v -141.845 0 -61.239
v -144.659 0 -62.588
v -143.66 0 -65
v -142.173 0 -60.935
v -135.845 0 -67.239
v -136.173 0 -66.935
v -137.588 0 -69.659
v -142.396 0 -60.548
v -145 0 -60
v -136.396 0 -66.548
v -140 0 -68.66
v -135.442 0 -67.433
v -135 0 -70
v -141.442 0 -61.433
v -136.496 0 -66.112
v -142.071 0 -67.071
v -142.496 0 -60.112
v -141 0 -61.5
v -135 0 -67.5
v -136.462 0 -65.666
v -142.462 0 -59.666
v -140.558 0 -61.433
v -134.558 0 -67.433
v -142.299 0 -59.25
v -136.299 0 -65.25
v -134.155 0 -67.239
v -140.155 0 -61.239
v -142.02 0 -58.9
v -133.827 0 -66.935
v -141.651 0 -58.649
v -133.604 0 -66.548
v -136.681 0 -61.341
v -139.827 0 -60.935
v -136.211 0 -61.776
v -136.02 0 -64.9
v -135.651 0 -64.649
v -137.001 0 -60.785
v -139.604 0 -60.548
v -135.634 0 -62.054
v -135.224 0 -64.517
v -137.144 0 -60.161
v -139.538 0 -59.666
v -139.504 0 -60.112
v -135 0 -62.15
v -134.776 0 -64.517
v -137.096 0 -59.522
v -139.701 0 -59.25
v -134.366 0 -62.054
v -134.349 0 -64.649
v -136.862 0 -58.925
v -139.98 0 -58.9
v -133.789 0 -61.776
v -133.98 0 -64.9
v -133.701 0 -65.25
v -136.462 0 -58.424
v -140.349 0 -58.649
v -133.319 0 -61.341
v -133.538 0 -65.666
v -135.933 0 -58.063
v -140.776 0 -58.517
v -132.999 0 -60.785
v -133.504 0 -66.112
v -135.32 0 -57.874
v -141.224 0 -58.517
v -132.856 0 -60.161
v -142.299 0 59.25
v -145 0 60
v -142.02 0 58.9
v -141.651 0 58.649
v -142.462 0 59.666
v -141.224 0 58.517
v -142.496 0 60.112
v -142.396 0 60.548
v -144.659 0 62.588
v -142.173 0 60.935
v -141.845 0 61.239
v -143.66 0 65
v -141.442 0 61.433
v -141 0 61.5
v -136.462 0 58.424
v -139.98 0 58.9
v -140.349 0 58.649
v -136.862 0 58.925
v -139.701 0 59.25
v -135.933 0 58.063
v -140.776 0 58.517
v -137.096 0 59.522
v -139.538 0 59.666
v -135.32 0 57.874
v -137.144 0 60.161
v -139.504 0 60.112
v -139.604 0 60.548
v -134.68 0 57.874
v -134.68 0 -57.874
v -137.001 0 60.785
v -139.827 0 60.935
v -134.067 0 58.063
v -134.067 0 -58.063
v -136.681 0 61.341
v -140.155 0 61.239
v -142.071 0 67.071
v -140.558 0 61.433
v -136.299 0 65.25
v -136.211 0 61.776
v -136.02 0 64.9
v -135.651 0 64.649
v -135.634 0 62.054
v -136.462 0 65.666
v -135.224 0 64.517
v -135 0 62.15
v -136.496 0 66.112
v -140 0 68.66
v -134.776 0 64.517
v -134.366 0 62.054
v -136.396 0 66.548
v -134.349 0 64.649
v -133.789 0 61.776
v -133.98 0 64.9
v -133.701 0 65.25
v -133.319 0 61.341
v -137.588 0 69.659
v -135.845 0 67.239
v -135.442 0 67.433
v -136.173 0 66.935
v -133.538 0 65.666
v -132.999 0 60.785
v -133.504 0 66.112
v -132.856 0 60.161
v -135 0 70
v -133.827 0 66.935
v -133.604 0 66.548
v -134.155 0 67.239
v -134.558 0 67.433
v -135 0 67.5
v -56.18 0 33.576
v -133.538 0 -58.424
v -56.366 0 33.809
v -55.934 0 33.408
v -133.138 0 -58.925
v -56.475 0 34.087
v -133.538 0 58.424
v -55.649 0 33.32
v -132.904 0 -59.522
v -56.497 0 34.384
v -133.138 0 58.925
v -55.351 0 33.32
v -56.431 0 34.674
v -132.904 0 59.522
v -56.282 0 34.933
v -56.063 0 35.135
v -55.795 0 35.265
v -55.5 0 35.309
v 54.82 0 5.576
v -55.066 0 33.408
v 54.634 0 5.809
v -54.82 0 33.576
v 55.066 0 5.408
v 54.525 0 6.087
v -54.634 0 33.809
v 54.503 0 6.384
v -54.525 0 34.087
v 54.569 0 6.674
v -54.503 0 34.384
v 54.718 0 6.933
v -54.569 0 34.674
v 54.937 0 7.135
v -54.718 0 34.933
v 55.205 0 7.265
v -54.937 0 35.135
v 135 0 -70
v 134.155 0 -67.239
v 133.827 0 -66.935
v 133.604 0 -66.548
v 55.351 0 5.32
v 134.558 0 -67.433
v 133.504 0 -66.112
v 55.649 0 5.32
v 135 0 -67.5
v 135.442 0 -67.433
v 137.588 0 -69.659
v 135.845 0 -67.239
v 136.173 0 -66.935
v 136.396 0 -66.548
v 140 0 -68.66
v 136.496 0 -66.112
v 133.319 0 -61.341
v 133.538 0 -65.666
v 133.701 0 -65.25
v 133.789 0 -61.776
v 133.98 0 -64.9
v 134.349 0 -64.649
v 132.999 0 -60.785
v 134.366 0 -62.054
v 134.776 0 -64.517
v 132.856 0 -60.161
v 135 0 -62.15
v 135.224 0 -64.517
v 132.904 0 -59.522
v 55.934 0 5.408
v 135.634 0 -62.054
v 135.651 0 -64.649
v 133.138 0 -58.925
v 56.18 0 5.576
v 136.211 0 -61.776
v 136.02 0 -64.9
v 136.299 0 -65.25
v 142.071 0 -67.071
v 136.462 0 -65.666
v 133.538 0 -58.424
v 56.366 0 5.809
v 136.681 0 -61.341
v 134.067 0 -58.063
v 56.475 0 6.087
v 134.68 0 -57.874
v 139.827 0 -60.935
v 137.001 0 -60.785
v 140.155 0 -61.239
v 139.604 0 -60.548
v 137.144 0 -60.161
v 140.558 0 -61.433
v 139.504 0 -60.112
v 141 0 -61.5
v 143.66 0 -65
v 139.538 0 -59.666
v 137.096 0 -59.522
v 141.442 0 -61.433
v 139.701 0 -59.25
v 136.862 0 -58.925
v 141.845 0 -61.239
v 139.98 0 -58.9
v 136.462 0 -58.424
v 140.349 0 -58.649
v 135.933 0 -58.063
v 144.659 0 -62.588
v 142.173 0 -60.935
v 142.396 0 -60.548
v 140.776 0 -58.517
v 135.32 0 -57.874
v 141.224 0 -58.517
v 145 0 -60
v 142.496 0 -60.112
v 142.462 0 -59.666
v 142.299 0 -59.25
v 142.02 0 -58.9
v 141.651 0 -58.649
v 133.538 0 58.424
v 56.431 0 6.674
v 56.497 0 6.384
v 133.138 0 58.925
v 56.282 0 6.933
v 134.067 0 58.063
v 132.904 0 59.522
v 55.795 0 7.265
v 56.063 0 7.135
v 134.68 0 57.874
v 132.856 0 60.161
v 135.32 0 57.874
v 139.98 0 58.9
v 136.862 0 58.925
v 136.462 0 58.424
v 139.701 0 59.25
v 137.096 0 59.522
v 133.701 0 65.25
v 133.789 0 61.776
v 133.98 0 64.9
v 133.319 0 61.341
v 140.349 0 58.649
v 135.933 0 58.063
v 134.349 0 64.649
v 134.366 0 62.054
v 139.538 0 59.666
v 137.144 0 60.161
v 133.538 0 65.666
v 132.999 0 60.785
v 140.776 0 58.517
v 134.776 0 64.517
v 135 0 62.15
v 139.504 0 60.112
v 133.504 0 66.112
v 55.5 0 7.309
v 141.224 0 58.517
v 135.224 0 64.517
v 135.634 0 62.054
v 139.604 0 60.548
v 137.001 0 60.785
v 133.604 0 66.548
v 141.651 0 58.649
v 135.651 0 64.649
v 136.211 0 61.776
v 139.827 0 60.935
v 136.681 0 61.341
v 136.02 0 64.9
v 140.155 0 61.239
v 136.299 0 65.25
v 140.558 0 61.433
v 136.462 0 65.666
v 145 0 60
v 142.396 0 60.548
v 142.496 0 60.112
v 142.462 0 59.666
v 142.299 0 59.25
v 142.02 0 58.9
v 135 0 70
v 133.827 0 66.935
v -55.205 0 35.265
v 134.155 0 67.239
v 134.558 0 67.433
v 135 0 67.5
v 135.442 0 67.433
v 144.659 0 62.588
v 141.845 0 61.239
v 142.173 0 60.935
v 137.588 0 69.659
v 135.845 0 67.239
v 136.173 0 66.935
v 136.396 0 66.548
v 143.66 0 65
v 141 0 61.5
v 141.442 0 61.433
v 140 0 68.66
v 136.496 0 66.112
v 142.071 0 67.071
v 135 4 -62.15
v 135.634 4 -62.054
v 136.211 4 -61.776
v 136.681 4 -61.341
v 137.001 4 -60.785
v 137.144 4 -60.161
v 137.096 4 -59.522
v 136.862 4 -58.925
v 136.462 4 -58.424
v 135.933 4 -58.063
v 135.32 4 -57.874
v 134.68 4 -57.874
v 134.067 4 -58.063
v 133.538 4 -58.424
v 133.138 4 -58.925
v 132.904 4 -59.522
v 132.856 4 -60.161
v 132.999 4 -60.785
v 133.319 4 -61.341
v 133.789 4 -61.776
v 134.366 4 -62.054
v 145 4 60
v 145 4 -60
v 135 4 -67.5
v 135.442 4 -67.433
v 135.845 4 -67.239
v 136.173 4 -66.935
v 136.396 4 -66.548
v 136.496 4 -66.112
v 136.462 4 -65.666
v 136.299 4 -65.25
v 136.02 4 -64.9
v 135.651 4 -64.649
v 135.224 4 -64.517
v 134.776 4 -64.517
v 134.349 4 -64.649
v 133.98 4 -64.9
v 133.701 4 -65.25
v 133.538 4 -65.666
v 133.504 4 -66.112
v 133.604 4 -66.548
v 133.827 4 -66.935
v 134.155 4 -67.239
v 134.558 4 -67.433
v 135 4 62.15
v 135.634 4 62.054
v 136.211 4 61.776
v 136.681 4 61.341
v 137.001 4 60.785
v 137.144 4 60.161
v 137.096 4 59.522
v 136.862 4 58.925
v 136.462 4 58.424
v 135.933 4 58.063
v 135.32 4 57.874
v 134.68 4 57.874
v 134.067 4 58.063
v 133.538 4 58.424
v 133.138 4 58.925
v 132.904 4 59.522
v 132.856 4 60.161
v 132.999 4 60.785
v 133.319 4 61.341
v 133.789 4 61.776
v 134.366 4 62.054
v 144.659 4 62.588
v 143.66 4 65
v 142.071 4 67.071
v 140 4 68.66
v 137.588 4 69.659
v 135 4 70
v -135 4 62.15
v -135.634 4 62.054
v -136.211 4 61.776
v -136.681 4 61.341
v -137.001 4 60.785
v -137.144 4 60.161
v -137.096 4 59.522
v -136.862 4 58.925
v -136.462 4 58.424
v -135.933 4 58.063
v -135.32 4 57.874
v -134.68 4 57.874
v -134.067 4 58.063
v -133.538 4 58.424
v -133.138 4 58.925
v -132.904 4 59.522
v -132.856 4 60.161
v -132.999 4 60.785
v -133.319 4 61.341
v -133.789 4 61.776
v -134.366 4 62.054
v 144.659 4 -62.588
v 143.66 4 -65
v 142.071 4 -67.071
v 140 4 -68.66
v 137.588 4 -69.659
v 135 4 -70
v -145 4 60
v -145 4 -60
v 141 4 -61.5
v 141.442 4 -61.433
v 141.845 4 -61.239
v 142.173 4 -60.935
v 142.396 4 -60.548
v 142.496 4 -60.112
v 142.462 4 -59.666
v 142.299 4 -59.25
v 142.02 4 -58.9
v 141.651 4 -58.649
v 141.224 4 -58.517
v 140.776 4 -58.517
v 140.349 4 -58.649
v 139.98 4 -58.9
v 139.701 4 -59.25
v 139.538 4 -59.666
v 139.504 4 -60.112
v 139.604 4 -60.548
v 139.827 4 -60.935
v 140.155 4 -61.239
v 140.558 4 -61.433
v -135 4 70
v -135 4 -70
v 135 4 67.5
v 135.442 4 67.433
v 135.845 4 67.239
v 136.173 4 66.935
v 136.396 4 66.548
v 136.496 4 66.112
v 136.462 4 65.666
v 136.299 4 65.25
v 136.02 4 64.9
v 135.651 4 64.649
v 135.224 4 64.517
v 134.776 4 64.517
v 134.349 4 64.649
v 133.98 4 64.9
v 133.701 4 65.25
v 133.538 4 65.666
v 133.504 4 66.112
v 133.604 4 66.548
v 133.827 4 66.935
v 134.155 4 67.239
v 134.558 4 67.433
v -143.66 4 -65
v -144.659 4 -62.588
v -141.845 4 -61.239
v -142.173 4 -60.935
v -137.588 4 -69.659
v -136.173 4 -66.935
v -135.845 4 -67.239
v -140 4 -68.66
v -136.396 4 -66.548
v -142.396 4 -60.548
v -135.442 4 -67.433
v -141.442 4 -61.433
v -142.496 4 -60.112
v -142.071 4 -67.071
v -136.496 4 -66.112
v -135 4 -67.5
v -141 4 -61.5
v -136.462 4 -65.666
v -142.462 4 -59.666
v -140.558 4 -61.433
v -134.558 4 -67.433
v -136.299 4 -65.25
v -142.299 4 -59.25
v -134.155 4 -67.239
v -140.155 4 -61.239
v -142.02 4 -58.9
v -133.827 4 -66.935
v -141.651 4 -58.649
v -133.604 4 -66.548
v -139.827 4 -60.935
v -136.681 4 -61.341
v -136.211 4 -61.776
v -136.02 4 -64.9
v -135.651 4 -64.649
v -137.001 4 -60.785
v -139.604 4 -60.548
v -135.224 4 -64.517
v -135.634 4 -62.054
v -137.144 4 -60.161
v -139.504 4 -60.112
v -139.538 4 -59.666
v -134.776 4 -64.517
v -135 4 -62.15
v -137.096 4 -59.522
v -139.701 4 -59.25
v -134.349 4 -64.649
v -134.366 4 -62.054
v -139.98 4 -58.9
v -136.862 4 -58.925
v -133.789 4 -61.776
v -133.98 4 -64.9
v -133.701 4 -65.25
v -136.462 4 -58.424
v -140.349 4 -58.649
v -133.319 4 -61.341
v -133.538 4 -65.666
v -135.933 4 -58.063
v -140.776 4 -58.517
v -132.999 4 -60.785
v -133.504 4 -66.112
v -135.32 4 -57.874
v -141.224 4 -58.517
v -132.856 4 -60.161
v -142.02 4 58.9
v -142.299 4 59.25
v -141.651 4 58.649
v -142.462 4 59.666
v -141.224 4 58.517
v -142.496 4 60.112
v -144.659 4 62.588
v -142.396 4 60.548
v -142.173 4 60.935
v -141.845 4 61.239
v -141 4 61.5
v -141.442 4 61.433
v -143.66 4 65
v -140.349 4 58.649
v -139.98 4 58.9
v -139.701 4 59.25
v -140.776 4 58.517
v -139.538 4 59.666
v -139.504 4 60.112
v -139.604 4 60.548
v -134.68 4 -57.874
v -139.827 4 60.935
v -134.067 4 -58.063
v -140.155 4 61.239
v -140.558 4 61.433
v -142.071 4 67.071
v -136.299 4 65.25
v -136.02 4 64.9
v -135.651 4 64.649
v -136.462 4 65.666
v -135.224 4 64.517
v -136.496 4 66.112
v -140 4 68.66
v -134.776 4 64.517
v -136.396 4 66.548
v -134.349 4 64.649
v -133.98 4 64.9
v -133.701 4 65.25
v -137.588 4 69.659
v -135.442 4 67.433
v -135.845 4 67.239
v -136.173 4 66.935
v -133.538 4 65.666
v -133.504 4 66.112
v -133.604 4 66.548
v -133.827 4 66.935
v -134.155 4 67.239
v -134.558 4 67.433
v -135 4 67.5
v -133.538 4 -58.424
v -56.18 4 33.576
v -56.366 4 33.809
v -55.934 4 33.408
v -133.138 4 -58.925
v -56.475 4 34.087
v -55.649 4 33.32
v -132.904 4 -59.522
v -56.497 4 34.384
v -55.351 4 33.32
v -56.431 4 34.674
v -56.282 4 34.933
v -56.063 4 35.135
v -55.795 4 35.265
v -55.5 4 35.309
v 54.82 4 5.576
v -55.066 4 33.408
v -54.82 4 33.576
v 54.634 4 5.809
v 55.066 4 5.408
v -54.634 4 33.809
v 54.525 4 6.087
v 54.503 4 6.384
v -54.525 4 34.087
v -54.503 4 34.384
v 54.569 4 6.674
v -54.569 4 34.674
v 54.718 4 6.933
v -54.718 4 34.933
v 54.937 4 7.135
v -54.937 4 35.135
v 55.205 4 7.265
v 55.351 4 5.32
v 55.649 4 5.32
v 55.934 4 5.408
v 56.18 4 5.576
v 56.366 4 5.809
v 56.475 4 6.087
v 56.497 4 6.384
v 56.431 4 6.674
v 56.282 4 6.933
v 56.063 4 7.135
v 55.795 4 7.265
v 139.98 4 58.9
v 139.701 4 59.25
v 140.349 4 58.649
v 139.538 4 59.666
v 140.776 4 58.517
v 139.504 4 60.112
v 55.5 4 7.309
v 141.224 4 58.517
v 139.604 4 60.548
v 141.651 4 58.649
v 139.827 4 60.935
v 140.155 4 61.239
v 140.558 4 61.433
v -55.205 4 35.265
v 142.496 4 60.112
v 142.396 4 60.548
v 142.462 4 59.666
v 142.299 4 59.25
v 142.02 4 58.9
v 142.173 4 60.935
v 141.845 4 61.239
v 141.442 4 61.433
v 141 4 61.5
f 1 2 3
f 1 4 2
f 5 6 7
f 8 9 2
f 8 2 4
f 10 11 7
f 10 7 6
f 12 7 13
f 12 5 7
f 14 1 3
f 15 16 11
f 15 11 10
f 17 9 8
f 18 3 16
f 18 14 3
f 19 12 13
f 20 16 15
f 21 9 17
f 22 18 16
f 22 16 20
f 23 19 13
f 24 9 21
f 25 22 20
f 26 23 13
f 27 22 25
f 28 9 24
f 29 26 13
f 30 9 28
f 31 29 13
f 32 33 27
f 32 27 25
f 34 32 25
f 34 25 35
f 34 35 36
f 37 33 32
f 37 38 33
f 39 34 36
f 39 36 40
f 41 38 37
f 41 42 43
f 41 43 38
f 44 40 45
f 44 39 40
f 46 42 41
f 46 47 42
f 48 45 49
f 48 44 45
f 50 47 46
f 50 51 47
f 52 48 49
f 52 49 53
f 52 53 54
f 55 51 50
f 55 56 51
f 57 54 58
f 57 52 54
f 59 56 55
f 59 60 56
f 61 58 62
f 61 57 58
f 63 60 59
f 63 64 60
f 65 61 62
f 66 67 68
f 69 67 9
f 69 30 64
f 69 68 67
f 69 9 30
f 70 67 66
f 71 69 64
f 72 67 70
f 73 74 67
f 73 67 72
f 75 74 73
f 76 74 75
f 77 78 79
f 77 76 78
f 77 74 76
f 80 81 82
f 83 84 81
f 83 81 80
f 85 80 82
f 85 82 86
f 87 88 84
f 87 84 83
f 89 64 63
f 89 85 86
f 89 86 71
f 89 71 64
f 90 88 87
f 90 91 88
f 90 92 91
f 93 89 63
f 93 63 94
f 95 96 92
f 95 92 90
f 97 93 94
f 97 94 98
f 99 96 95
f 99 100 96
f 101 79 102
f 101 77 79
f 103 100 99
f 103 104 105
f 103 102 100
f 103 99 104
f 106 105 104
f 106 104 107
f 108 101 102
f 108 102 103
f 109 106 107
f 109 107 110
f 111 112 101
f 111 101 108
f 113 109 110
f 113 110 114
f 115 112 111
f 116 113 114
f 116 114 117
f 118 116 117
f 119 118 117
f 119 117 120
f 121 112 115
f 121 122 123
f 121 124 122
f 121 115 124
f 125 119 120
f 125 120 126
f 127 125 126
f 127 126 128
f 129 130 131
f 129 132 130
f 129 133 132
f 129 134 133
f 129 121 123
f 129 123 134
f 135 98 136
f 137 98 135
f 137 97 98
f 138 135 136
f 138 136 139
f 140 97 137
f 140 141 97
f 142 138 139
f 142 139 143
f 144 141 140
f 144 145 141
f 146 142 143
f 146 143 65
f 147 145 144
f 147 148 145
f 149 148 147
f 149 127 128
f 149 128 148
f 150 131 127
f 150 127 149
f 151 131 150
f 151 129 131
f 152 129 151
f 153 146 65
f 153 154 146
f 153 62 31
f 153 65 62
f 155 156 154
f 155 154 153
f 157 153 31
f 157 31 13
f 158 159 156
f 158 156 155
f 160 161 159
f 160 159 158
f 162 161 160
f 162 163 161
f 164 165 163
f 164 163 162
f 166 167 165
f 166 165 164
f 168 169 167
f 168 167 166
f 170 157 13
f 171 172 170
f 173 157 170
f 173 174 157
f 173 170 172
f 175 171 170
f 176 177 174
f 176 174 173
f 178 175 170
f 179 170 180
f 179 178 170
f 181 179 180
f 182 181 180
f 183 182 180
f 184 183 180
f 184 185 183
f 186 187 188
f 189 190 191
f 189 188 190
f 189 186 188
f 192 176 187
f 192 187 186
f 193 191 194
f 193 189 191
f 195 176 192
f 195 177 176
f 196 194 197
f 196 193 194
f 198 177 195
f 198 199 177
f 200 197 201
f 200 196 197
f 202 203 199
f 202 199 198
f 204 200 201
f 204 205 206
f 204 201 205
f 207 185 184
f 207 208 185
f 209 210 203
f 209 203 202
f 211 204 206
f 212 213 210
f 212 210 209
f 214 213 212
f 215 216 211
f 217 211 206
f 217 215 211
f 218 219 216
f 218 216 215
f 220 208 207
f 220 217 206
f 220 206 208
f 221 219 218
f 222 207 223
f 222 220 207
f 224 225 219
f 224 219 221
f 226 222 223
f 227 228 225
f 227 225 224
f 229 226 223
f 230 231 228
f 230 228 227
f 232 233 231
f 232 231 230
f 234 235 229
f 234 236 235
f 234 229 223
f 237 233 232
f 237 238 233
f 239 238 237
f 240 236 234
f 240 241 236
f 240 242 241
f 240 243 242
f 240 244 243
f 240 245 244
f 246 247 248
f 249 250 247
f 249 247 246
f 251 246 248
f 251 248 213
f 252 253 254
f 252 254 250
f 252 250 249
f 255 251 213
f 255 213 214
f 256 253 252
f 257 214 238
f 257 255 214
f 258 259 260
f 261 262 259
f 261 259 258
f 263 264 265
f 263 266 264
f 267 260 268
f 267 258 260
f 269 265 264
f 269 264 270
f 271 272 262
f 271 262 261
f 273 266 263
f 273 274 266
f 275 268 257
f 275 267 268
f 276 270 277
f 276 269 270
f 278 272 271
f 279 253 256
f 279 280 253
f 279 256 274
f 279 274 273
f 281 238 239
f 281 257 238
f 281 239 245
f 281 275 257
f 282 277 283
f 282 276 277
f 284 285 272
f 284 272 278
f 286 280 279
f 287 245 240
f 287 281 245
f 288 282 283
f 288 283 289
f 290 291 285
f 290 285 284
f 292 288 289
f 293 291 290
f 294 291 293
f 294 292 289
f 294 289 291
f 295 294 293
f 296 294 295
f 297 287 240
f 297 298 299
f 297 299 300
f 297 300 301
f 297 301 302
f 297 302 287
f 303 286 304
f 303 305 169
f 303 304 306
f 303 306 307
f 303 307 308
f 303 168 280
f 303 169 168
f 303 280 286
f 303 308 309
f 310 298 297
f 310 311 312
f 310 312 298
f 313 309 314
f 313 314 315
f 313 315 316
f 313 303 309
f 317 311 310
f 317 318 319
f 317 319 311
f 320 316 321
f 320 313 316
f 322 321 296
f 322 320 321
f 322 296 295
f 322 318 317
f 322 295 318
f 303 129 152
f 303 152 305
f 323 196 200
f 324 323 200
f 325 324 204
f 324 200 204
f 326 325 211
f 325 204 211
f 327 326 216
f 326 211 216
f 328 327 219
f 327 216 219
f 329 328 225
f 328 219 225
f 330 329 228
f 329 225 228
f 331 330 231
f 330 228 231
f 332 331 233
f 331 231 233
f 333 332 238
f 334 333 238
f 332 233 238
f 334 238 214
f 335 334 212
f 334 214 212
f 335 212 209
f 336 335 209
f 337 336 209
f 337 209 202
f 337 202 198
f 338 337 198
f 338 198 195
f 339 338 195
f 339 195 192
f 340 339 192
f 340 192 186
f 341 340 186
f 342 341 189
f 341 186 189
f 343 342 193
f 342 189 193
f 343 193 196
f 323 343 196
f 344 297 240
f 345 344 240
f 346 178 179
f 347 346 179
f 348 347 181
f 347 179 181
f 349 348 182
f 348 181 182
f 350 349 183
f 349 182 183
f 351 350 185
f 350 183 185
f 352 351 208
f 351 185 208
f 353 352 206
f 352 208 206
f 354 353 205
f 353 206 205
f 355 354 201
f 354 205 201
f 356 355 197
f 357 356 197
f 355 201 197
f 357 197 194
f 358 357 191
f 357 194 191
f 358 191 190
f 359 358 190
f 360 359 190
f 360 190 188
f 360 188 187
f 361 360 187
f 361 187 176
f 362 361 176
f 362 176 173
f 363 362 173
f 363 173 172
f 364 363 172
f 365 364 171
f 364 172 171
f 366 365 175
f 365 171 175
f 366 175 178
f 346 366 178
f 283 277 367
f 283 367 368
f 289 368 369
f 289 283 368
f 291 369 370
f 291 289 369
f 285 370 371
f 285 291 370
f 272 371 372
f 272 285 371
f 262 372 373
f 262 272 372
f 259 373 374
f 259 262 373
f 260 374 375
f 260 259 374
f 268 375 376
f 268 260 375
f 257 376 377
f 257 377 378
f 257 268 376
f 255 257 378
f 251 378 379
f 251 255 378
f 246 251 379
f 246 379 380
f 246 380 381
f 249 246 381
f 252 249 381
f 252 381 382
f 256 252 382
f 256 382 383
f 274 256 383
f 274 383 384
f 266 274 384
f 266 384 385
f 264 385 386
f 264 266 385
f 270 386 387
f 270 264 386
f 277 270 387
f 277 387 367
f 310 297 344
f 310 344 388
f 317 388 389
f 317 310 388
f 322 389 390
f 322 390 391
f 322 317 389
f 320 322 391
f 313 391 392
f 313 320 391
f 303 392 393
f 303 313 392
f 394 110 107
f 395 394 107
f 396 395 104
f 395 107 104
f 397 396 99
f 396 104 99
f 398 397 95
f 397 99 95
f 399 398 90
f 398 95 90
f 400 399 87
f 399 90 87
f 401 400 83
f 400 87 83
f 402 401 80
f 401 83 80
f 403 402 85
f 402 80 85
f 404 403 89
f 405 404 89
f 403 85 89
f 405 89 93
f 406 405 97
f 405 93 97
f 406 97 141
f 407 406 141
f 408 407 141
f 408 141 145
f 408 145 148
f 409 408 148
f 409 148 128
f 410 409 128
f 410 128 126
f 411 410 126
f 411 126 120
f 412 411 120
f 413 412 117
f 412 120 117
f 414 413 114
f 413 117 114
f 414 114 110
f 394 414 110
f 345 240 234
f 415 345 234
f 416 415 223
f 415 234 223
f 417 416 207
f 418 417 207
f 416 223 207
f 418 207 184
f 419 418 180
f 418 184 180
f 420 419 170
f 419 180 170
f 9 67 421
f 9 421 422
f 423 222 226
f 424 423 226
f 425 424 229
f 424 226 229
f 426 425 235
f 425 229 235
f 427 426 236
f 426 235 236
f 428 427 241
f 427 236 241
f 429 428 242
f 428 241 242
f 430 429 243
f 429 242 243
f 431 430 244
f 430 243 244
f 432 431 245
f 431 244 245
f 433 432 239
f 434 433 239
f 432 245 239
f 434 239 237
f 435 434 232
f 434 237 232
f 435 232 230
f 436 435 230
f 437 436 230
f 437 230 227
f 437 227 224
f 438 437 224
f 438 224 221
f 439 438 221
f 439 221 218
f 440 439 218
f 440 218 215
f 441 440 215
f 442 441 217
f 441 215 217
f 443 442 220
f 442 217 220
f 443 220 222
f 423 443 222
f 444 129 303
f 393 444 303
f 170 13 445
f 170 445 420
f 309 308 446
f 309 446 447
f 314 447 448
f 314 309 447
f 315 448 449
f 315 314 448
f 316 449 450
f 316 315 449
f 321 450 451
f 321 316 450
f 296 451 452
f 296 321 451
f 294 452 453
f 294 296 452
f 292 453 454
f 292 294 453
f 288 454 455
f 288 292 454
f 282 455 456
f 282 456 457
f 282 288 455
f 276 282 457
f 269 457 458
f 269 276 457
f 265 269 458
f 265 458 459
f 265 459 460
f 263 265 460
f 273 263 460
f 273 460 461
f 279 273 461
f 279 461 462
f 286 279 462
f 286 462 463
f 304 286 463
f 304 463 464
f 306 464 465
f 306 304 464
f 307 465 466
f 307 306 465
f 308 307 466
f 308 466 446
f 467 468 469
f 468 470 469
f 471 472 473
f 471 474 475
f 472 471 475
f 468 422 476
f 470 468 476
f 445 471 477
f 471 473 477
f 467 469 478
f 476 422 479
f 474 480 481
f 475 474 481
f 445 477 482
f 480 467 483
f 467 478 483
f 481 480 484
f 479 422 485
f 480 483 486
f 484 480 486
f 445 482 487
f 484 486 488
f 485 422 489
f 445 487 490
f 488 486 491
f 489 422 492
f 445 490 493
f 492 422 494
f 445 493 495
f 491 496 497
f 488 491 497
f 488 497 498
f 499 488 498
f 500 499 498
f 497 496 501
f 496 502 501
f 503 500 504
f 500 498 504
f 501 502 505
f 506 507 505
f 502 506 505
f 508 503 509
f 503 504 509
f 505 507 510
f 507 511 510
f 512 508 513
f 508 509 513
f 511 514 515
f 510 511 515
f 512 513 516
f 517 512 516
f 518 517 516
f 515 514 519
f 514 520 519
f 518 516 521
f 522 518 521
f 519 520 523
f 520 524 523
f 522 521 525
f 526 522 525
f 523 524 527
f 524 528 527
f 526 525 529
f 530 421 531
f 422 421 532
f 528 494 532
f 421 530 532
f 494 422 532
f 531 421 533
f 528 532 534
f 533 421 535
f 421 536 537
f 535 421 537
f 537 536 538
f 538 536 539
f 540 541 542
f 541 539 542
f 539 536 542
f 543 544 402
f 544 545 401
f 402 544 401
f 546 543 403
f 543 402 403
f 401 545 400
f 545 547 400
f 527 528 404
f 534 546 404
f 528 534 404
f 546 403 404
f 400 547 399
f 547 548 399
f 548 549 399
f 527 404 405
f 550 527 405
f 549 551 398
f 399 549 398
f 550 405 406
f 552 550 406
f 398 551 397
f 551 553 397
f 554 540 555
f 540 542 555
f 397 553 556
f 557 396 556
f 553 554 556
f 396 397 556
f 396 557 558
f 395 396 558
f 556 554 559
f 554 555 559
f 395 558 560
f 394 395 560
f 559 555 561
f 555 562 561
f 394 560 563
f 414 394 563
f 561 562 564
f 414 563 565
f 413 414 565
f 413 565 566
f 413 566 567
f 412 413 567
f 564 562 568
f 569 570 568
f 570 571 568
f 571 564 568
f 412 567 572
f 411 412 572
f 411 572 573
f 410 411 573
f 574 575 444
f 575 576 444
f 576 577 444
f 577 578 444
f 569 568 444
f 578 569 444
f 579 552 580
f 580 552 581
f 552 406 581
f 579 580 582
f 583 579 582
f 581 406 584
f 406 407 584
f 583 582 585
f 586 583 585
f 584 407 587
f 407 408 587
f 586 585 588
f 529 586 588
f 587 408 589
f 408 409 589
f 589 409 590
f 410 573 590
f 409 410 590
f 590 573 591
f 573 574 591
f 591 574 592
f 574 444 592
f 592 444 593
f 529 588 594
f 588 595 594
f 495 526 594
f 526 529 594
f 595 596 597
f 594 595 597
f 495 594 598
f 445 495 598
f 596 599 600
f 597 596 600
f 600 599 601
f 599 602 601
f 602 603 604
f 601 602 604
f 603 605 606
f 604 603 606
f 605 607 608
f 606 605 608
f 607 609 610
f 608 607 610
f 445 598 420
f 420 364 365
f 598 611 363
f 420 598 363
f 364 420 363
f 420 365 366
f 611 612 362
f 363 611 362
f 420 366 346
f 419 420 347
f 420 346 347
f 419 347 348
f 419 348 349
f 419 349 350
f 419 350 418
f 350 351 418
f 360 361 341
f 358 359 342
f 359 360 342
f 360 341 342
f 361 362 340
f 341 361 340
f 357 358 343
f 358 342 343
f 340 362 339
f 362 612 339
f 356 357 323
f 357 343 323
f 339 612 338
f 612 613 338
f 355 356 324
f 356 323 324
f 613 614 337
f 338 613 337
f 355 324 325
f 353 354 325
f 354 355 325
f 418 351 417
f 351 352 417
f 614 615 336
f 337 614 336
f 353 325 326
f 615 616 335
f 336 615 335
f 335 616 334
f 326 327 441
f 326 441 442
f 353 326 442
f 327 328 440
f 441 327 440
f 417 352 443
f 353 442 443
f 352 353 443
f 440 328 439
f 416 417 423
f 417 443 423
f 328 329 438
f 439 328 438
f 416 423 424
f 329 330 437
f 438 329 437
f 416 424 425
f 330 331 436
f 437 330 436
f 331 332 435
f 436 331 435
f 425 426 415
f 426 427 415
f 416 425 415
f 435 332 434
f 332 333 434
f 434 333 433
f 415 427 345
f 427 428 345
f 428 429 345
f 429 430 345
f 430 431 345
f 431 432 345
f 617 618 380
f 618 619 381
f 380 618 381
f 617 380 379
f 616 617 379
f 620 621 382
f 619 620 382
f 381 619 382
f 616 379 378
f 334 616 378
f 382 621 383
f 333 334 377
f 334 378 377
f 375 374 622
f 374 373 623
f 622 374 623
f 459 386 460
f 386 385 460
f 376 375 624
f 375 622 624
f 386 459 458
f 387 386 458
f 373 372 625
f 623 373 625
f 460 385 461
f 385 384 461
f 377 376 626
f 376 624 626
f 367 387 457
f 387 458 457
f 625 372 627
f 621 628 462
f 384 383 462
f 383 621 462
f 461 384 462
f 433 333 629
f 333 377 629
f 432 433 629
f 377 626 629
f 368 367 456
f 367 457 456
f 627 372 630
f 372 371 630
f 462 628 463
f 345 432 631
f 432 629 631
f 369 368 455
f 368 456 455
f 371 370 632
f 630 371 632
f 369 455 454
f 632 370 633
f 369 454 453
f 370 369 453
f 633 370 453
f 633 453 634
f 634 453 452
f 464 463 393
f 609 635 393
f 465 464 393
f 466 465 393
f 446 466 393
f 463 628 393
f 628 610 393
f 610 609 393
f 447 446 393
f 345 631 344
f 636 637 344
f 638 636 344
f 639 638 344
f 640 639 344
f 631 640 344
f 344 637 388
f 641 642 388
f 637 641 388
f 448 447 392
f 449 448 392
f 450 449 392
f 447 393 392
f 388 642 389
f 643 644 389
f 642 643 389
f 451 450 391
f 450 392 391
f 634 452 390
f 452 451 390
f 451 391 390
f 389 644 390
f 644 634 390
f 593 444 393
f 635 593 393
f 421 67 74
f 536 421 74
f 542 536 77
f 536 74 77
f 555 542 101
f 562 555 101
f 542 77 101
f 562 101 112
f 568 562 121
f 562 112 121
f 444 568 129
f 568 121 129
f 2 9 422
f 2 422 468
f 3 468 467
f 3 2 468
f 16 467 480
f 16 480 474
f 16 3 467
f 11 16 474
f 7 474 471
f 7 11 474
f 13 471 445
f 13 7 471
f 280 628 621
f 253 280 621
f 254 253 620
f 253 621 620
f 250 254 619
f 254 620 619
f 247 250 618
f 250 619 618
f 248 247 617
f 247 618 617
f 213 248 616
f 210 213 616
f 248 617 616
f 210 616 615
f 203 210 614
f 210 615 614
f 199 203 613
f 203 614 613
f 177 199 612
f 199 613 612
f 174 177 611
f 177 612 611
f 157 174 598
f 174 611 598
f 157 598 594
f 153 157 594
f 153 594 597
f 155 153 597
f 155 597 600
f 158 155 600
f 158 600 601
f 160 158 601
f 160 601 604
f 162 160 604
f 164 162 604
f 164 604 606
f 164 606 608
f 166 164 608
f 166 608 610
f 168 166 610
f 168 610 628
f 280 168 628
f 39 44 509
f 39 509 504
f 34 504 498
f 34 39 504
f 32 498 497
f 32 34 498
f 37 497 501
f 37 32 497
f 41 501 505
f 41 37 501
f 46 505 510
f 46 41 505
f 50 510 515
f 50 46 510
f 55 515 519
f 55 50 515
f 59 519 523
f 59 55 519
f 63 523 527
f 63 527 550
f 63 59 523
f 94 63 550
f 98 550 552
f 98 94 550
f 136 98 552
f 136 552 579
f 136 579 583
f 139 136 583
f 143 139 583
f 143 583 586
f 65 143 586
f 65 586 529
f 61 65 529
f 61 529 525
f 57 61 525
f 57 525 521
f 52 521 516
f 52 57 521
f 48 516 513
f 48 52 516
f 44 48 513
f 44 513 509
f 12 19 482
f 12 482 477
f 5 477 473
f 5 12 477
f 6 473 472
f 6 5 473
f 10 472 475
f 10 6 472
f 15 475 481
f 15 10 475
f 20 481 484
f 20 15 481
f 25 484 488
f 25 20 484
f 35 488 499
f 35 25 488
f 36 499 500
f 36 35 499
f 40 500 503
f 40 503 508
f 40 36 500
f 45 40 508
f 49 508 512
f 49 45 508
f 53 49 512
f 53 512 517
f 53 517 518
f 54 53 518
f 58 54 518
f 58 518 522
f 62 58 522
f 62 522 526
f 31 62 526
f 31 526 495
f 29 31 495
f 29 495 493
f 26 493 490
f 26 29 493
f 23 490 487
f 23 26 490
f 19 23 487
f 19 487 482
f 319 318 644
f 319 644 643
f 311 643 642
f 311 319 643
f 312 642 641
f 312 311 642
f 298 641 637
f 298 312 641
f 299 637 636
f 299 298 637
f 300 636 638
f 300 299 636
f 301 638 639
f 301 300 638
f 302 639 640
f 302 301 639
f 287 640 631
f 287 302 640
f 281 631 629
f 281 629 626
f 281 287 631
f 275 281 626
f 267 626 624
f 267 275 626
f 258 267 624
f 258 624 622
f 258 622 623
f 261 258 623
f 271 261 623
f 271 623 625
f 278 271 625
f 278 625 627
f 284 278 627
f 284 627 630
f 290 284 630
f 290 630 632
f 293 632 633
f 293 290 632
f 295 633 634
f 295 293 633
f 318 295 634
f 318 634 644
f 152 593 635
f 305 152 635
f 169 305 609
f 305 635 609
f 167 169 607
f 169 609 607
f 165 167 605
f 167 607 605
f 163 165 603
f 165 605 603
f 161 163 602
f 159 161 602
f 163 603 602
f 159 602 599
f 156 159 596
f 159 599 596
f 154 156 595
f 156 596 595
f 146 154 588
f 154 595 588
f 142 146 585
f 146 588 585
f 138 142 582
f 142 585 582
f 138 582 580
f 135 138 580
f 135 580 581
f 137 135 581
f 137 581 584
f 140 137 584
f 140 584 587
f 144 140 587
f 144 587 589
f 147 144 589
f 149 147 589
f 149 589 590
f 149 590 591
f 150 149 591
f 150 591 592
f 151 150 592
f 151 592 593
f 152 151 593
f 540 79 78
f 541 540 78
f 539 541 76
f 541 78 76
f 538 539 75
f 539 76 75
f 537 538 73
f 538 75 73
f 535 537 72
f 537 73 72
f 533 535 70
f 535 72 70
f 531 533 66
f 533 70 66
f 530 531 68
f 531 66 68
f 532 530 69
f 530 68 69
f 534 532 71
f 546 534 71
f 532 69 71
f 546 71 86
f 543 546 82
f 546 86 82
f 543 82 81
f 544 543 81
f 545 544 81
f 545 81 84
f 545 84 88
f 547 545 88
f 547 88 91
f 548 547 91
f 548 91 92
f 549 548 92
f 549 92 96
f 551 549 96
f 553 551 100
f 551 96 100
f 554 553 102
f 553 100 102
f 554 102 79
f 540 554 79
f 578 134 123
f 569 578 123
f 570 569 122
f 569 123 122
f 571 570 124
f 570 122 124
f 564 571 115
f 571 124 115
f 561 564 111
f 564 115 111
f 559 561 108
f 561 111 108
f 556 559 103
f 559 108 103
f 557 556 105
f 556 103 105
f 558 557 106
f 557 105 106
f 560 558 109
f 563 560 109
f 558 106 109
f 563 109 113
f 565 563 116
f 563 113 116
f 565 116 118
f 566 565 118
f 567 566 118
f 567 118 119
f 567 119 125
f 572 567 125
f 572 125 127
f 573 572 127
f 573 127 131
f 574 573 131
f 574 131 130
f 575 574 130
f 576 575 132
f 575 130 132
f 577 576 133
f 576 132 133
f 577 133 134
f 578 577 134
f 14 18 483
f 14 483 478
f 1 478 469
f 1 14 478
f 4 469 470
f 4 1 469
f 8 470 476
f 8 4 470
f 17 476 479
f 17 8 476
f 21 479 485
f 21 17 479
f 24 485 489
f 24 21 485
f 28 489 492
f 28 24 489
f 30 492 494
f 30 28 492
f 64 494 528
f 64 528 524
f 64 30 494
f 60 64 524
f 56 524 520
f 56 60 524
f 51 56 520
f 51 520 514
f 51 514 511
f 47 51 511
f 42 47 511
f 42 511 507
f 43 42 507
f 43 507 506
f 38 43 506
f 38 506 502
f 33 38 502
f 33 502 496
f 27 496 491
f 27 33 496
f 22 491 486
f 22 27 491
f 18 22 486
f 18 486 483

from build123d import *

# Parameters (mm, degrees)
SKETCH1_R                 = 2.15
SKETCH1_R_2               = 1.5
BOSS_EXTRUDE1_DEPTH       = 4
MIRROR2_COPY_1_SKETCH_R   = 2.15
MIRROR2_COPY_1_SKETCH_R_2 = 1.5
MIRROR2_COPY_1_DEPTH      = 4
SKETCH2_R                 = 1
CUT_EXTRUDE1_DEPTH        = 10


with BuildPart() as part:
    # Sketch1 → Boss-Extrude1 (new body)
    with BuildSketch(Plane(origin=(0, 0, 0), x_dir=(1, 0, 0), z_dir=(0, 1, 0))):
        with BuildLine():
            Line((145, 0), (145, -60))
            ThreePointArc((145, -60), (142.071067812, -67.071067812), (135, -70))
            Line((135, -70), (0, -70))
            Line((0, -70), (0, 0))
            Line((0, 0), (145, 0))
        make_face()
        with Locations(Location((135, -60, 0), (0, 0, 270))):
            Circle(SKETCH1_R, mode=Mode.SUBTRACT)
        with Locations(Location((141, -60, 0), (0, 0, 270))):
            Circle(SKETCH1_R_2, mode=Mode.SUBTRACT)
        with Locations(Location((135, -66, 0), (0, 0, 270))):
            Circle(SKETCH1_R_2, mode=Mode.SUBTRACT)
    boss_extrude1 = extrude(amount=BOSS_EXTRUDE1_DEPTH)

    # Mirror1: Boss-Extrude1 across plane
    add(boss_extrude1.mirror(Plane(origin=(0, 0, 0), x_dir=(0, 0, 1), z_dir=(1, 0, 0))))

    # Mirror2: Boss-Extrude1 across plane
    add(boss_extrude1.mirror(Plane.XY))

    # Mirror2 copy 1 sketch → Mirror2 copy 1 (add)
    with BuildSketch(Plane(origin=(0, 0, 0), x_dir=(-1, 0, 0), z_dir=(0, 1, 0))):
        with BuildLine():
            Line((145, 0), (145, -60))
            ThreePointArc((145, -60), (142.071067812, -67.071067812), (135, -70))
            Line((135, -70), (0, -70))
            Line((0, -70), (0, 0))
            Line((0, 0), (145, 0))
        make_face()
        with Locations(Location((135, -60, 0), (0, 0, 270))):
            Circle(MIRROR2_COPY_1_SKETCH_R, mode=Mode.SUBTRACT)
        with Locations(Location((141, -60, 0), (0, 0, 270))):
            Circle(MIRROR2_COPY_1_SKETCH_R_2, mode=Mode.SUBTRACT)
        with Locations(Location((135, -66, 0), (0, 0, 270))):
            Circle(MIRROR2_COPY_1_SKETCH_R_2, mode=Mode.SUBTRACT)
    extrude(amount=MIRROR2_COPY_1_DEPTH)

    # Sketch2 → Cut-Extrude1 (cut)
    with BuildSketch(Plane(origin=(0, 6, 0), x_dir=(1, 0, 0), z_dir=(0, 1, 0))):
        with Locations(Location((55.5, -6.309138883, 0), (0, 0, 270))):
            Circle(SKETCH2_R)
        with Locations(Location((-55.5, -34.309138883, 0), (0, 0, 270))):
            Circle(SKETCH2_R)
    extrude(amount=-CUT_EXTRUDE1_DEPTH, mode=Mode.SUBTRACT)


solid = part.part
